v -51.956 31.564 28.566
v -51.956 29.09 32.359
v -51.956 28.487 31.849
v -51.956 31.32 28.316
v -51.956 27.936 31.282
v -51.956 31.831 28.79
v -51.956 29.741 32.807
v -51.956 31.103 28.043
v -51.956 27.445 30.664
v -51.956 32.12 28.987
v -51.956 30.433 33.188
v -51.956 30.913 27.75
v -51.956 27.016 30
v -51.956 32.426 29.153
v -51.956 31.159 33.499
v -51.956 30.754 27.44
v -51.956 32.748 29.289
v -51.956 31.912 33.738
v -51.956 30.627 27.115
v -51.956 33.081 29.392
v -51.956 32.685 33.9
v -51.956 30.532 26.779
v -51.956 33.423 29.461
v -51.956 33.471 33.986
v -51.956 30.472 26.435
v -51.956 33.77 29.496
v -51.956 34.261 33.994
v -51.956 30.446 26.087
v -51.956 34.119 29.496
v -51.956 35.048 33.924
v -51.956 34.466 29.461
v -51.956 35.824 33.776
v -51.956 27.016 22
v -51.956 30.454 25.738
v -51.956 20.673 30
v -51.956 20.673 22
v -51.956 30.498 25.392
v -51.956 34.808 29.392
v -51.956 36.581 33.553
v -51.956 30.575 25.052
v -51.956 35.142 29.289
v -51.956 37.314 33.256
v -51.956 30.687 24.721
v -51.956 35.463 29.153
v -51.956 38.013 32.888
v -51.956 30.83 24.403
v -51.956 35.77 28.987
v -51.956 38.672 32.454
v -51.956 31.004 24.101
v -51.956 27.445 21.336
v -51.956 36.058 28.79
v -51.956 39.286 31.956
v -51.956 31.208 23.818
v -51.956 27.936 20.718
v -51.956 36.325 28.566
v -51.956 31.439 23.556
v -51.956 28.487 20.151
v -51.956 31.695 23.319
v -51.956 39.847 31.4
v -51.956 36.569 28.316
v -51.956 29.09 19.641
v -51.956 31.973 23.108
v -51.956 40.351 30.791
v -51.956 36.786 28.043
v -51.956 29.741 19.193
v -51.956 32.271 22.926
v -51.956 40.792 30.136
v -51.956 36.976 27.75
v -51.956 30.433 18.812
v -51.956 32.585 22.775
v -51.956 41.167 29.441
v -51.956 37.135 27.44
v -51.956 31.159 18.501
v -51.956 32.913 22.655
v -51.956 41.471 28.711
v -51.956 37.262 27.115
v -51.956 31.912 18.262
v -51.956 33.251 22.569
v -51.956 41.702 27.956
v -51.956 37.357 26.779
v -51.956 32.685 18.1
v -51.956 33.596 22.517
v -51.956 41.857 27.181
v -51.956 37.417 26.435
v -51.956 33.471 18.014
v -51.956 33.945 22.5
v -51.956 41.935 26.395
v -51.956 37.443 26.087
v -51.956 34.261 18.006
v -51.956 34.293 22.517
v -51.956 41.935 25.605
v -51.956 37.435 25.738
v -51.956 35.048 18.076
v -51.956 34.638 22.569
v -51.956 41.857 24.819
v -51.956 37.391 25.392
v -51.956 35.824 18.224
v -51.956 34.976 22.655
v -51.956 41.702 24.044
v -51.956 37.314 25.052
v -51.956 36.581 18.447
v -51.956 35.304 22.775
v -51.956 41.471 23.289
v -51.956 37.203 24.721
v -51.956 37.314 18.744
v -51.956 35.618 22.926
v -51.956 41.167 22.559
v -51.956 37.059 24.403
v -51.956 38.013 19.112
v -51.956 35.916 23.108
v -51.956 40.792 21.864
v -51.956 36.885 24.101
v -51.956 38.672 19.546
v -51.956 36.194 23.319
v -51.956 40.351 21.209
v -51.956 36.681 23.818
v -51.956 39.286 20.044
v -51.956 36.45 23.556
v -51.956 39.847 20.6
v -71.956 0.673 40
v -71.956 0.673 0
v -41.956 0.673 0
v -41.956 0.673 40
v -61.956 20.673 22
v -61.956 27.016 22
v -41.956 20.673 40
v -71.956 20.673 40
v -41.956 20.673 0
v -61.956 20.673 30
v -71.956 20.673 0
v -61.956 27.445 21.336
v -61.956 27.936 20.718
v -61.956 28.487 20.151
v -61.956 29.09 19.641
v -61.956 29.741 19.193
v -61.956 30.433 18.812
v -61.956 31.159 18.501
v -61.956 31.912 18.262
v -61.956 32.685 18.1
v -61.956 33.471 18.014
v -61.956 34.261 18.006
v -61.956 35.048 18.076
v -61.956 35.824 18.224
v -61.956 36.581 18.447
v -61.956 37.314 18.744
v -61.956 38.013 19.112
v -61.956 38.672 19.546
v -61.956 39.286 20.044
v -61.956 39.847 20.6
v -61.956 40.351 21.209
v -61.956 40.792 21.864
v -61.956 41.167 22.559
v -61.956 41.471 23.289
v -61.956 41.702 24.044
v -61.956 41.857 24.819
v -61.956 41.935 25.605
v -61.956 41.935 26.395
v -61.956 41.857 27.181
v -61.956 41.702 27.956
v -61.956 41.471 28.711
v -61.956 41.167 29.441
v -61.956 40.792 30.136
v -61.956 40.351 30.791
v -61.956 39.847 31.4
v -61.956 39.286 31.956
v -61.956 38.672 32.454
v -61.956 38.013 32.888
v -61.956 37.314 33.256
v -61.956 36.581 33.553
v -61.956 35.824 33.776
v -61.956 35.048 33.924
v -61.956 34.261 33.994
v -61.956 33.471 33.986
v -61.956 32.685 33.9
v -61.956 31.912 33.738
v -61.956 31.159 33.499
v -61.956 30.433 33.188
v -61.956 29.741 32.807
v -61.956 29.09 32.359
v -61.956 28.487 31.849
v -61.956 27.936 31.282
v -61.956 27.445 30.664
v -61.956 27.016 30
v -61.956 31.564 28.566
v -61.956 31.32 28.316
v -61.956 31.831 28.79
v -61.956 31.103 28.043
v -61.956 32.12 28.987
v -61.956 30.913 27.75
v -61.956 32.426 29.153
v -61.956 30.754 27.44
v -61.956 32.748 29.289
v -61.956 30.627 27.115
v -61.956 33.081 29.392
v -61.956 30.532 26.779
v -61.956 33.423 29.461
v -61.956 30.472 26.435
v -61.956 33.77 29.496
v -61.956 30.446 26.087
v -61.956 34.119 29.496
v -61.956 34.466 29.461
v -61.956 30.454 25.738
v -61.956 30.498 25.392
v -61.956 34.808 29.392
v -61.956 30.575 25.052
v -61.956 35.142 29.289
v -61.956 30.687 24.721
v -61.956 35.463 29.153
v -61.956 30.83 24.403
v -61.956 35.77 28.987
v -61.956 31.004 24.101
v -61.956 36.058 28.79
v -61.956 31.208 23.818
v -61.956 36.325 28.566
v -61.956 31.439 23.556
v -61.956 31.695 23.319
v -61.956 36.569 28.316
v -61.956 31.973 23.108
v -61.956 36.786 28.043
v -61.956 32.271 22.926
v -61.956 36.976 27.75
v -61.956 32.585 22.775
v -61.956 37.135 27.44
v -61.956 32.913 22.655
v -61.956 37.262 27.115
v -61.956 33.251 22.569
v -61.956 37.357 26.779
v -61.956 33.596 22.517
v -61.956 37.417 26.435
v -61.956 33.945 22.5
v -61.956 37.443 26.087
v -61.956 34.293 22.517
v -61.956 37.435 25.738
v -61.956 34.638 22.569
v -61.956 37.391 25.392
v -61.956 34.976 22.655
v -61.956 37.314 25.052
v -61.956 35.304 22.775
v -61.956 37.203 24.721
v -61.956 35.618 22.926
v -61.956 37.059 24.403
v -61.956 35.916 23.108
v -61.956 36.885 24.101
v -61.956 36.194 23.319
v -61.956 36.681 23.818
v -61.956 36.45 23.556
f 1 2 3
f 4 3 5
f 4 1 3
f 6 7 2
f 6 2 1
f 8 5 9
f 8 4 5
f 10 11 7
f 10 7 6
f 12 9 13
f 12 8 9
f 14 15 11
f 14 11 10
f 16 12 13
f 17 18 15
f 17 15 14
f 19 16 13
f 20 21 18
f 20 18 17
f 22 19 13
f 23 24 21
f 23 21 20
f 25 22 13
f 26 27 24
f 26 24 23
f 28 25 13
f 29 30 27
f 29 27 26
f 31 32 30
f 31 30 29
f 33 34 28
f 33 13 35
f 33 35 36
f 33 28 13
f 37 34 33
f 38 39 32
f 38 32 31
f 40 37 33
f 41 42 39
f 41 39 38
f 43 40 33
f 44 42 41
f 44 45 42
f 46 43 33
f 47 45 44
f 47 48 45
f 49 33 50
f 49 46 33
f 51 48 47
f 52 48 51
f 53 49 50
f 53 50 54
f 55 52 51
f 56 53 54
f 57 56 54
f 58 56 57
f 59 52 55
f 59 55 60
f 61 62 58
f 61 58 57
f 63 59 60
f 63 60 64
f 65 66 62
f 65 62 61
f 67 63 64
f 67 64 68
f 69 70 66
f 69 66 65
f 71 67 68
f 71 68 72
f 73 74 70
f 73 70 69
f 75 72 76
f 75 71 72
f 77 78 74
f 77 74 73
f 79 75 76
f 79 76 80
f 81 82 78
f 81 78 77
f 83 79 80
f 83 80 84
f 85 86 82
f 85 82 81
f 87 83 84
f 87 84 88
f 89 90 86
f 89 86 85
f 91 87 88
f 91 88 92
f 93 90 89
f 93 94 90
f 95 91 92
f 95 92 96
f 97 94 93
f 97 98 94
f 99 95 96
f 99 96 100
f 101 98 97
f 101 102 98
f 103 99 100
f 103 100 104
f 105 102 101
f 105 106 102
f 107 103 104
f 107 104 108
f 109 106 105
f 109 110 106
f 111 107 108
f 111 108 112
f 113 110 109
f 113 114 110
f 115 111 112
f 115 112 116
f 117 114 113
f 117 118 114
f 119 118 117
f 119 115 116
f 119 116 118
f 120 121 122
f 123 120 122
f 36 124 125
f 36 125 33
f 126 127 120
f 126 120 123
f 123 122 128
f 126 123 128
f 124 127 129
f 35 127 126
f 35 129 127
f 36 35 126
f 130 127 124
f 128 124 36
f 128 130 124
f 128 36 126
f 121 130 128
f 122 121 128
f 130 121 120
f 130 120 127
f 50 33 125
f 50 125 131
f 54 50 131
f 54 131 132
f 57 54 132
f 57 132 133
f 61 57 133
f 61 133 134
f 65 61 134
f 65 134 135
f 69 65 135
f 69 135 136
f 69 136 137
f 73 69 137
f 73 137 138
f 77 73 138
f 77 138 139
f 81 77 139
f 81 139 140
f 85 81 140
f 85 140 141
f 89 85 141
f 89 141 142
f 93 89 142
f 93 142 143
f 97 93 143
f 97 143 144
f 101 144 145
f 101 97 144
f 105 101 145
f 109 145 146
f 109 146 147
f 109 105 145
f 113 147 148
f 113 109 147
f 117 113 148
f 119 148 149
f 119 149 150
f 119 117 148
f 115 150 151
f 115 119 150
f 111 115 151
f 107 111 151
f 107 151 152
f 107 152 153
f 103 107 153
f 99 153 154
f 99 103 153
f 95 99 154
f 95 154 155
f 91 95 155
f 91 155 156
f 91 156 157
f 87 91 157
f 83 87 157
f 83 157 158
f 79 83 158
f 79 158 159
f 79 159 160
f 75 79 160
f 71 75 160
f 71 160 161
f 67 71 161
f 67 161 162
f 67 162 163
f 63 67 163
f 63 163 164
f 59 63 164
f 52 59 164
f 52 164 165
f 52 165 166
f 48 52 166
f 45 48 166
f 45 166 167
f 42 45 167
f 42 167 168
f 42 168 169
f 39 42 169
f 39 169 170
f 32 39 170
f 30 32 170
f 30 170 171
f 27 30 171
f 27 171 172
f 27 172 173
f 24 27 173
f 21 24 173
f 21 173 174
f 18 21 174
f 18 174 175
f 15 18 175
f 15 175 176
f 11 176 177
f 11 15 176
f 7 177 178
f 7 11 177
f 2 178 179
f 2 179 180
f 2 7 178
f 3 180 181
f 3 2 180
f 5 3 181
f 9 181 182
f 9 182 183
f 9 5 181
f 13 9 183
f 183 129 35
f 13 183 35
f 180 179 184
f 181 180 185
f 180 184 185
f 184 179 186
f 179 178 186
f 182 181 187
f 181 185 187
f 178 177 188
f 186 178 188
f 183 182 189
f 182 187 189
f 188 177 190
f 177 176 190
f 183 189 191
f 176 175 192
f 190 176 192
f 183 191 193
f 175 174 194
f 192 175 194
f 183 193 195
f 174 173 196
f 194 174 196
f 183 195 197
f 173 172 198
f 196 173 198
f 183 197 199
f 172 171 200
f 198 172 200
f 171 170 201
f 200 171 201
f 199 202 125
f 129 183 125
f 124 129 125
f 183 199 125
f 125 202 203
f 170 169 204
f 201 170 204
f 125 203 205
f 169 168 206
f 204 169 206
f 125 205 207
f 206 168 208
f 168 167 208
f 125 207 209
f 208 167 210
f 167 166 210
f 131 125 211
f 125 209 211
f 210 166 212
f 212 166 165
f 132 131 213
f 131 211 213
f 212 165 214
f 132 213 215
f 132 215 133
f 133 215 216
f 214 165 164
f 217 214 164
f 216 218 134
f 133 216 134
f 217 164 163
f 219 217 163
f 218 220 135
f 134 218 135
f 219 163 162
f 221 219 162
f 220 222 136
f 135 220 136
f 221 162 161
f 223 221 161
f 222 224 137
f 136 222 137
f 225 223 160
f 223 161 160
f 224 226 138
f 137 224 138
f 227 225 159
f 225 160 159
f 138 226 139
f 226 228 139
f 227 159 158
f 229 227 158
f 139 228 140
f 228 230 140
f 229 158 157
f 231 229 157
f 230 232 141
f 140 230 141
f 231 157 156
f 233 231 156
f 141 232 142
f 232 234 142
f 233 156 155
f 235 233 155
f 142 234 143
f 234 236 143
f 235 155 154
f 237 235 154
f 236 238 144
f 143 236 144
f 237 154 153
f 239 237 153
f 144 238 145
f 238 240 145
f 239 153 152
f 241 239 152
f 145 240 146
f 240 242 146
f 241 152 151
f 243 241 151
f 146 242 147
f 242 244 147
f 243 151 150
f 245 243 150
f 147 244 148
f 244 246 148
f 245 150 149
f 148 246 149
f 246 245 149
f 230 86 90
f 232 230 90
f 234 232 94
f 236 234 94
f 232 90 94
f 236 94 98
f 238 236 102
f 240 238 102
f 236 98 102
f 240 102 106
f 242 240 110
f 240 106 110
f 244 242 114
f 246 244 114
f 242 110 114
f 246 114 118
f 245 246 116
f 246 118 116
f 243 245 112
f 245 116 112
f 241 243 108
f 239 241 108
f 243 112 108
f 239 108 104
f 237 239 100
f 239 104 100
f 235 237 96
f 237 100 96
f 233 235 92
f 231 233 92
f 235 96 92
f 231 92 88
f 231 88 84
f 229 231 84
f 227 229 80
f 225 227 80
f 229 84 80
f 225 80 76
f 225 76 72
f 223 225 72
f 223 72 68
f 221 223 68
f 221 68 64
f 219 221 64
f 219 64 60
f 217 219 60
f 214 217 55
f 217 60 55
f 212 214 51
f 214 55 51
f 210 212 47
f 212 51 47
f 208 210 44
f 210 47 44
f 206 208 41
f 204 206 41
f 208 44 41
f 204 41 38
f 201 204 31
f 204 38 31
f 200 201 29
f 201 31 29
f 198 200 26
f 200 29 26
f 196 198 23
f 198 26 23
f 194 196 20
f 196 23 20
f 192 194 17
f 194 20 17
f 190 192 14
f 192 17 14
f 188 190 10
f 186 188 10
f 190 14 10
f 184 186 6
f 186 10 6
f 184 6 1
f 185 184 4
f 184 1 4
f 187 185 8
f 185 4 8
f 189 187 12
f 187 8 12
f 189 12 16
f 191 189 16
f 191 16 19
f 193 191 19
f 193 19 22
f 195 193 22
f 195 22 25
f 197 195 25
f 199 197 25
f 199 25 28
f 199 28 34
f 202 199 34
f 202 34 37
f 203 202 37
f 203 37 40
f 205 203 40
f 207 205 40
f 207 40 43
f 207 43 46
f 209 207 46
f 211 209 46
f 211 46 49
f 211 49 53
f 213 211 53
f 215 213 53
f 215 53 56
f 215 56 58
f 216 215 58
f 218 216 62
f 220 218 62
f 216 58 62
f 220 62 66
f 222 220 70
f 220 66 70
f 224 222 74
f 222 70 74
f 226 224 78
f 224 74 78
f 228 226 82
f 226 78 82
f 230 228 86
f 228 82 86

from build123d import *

# Parameters (mm, degrees)
ESQUISSE1_W        = 30
ESQUISSE1_H        = 20
BOSS_EXTRU_1_DEPTH = 40
ESQUISSE3_W        = 10
ESQUISSE3_H        = 8
BOSS_EXTRU_2_DEPTH = 8
ESQUISSE6_R        = 8
ESQUISSE6_R_2      = 3.5
BOSS_EXTRU_3_DEPTH = 10


with BuildPart() as part:
    # Esquisse1 → Boss.-Extru.1 (new body)
    with BuildSketch(Plane.XY):
        with Locations((-56.95643744, 10.673454793)):
            Rectangle(ESQUISSE1_W, ESQUISSE1_H)
    extrude(amount=BOSS_EXTRU_1_DEPTH)

    # Esquisse3 → Boss.-Extru.2 (add)
    with BuildSketch(Plane(origin=(0, 20.673454793, 0), x_dir=(1, 0, 0), z_dir=(0, 1, 0))):
        with Locations((-56.95643744, -26)):
            Rectangle(ESQUISSE3_W, ESQUISSE3_H)
    extrude(amount=BOSS_EXTRU_2_DEPTH)

    # Esquisse6 → Boss.-Extru.3 (add)
    with BuildSketch(Plane(origin=(-51.95643744, 0, 0), x_dir=(0, 0, -1), z_dir=(1, 0, 0))):
        with Locations((-26, 33.944580359)):
            Circle(ESQUISSE6_R)
        with Locations((-26, 33.944580359)):
            Circle(ESQUISSE6_R_2, mode=Mode.SUBTRACT)
    extrude(amount=-BOSS_EXTRU_3_DEPTH)


solid = part.part
